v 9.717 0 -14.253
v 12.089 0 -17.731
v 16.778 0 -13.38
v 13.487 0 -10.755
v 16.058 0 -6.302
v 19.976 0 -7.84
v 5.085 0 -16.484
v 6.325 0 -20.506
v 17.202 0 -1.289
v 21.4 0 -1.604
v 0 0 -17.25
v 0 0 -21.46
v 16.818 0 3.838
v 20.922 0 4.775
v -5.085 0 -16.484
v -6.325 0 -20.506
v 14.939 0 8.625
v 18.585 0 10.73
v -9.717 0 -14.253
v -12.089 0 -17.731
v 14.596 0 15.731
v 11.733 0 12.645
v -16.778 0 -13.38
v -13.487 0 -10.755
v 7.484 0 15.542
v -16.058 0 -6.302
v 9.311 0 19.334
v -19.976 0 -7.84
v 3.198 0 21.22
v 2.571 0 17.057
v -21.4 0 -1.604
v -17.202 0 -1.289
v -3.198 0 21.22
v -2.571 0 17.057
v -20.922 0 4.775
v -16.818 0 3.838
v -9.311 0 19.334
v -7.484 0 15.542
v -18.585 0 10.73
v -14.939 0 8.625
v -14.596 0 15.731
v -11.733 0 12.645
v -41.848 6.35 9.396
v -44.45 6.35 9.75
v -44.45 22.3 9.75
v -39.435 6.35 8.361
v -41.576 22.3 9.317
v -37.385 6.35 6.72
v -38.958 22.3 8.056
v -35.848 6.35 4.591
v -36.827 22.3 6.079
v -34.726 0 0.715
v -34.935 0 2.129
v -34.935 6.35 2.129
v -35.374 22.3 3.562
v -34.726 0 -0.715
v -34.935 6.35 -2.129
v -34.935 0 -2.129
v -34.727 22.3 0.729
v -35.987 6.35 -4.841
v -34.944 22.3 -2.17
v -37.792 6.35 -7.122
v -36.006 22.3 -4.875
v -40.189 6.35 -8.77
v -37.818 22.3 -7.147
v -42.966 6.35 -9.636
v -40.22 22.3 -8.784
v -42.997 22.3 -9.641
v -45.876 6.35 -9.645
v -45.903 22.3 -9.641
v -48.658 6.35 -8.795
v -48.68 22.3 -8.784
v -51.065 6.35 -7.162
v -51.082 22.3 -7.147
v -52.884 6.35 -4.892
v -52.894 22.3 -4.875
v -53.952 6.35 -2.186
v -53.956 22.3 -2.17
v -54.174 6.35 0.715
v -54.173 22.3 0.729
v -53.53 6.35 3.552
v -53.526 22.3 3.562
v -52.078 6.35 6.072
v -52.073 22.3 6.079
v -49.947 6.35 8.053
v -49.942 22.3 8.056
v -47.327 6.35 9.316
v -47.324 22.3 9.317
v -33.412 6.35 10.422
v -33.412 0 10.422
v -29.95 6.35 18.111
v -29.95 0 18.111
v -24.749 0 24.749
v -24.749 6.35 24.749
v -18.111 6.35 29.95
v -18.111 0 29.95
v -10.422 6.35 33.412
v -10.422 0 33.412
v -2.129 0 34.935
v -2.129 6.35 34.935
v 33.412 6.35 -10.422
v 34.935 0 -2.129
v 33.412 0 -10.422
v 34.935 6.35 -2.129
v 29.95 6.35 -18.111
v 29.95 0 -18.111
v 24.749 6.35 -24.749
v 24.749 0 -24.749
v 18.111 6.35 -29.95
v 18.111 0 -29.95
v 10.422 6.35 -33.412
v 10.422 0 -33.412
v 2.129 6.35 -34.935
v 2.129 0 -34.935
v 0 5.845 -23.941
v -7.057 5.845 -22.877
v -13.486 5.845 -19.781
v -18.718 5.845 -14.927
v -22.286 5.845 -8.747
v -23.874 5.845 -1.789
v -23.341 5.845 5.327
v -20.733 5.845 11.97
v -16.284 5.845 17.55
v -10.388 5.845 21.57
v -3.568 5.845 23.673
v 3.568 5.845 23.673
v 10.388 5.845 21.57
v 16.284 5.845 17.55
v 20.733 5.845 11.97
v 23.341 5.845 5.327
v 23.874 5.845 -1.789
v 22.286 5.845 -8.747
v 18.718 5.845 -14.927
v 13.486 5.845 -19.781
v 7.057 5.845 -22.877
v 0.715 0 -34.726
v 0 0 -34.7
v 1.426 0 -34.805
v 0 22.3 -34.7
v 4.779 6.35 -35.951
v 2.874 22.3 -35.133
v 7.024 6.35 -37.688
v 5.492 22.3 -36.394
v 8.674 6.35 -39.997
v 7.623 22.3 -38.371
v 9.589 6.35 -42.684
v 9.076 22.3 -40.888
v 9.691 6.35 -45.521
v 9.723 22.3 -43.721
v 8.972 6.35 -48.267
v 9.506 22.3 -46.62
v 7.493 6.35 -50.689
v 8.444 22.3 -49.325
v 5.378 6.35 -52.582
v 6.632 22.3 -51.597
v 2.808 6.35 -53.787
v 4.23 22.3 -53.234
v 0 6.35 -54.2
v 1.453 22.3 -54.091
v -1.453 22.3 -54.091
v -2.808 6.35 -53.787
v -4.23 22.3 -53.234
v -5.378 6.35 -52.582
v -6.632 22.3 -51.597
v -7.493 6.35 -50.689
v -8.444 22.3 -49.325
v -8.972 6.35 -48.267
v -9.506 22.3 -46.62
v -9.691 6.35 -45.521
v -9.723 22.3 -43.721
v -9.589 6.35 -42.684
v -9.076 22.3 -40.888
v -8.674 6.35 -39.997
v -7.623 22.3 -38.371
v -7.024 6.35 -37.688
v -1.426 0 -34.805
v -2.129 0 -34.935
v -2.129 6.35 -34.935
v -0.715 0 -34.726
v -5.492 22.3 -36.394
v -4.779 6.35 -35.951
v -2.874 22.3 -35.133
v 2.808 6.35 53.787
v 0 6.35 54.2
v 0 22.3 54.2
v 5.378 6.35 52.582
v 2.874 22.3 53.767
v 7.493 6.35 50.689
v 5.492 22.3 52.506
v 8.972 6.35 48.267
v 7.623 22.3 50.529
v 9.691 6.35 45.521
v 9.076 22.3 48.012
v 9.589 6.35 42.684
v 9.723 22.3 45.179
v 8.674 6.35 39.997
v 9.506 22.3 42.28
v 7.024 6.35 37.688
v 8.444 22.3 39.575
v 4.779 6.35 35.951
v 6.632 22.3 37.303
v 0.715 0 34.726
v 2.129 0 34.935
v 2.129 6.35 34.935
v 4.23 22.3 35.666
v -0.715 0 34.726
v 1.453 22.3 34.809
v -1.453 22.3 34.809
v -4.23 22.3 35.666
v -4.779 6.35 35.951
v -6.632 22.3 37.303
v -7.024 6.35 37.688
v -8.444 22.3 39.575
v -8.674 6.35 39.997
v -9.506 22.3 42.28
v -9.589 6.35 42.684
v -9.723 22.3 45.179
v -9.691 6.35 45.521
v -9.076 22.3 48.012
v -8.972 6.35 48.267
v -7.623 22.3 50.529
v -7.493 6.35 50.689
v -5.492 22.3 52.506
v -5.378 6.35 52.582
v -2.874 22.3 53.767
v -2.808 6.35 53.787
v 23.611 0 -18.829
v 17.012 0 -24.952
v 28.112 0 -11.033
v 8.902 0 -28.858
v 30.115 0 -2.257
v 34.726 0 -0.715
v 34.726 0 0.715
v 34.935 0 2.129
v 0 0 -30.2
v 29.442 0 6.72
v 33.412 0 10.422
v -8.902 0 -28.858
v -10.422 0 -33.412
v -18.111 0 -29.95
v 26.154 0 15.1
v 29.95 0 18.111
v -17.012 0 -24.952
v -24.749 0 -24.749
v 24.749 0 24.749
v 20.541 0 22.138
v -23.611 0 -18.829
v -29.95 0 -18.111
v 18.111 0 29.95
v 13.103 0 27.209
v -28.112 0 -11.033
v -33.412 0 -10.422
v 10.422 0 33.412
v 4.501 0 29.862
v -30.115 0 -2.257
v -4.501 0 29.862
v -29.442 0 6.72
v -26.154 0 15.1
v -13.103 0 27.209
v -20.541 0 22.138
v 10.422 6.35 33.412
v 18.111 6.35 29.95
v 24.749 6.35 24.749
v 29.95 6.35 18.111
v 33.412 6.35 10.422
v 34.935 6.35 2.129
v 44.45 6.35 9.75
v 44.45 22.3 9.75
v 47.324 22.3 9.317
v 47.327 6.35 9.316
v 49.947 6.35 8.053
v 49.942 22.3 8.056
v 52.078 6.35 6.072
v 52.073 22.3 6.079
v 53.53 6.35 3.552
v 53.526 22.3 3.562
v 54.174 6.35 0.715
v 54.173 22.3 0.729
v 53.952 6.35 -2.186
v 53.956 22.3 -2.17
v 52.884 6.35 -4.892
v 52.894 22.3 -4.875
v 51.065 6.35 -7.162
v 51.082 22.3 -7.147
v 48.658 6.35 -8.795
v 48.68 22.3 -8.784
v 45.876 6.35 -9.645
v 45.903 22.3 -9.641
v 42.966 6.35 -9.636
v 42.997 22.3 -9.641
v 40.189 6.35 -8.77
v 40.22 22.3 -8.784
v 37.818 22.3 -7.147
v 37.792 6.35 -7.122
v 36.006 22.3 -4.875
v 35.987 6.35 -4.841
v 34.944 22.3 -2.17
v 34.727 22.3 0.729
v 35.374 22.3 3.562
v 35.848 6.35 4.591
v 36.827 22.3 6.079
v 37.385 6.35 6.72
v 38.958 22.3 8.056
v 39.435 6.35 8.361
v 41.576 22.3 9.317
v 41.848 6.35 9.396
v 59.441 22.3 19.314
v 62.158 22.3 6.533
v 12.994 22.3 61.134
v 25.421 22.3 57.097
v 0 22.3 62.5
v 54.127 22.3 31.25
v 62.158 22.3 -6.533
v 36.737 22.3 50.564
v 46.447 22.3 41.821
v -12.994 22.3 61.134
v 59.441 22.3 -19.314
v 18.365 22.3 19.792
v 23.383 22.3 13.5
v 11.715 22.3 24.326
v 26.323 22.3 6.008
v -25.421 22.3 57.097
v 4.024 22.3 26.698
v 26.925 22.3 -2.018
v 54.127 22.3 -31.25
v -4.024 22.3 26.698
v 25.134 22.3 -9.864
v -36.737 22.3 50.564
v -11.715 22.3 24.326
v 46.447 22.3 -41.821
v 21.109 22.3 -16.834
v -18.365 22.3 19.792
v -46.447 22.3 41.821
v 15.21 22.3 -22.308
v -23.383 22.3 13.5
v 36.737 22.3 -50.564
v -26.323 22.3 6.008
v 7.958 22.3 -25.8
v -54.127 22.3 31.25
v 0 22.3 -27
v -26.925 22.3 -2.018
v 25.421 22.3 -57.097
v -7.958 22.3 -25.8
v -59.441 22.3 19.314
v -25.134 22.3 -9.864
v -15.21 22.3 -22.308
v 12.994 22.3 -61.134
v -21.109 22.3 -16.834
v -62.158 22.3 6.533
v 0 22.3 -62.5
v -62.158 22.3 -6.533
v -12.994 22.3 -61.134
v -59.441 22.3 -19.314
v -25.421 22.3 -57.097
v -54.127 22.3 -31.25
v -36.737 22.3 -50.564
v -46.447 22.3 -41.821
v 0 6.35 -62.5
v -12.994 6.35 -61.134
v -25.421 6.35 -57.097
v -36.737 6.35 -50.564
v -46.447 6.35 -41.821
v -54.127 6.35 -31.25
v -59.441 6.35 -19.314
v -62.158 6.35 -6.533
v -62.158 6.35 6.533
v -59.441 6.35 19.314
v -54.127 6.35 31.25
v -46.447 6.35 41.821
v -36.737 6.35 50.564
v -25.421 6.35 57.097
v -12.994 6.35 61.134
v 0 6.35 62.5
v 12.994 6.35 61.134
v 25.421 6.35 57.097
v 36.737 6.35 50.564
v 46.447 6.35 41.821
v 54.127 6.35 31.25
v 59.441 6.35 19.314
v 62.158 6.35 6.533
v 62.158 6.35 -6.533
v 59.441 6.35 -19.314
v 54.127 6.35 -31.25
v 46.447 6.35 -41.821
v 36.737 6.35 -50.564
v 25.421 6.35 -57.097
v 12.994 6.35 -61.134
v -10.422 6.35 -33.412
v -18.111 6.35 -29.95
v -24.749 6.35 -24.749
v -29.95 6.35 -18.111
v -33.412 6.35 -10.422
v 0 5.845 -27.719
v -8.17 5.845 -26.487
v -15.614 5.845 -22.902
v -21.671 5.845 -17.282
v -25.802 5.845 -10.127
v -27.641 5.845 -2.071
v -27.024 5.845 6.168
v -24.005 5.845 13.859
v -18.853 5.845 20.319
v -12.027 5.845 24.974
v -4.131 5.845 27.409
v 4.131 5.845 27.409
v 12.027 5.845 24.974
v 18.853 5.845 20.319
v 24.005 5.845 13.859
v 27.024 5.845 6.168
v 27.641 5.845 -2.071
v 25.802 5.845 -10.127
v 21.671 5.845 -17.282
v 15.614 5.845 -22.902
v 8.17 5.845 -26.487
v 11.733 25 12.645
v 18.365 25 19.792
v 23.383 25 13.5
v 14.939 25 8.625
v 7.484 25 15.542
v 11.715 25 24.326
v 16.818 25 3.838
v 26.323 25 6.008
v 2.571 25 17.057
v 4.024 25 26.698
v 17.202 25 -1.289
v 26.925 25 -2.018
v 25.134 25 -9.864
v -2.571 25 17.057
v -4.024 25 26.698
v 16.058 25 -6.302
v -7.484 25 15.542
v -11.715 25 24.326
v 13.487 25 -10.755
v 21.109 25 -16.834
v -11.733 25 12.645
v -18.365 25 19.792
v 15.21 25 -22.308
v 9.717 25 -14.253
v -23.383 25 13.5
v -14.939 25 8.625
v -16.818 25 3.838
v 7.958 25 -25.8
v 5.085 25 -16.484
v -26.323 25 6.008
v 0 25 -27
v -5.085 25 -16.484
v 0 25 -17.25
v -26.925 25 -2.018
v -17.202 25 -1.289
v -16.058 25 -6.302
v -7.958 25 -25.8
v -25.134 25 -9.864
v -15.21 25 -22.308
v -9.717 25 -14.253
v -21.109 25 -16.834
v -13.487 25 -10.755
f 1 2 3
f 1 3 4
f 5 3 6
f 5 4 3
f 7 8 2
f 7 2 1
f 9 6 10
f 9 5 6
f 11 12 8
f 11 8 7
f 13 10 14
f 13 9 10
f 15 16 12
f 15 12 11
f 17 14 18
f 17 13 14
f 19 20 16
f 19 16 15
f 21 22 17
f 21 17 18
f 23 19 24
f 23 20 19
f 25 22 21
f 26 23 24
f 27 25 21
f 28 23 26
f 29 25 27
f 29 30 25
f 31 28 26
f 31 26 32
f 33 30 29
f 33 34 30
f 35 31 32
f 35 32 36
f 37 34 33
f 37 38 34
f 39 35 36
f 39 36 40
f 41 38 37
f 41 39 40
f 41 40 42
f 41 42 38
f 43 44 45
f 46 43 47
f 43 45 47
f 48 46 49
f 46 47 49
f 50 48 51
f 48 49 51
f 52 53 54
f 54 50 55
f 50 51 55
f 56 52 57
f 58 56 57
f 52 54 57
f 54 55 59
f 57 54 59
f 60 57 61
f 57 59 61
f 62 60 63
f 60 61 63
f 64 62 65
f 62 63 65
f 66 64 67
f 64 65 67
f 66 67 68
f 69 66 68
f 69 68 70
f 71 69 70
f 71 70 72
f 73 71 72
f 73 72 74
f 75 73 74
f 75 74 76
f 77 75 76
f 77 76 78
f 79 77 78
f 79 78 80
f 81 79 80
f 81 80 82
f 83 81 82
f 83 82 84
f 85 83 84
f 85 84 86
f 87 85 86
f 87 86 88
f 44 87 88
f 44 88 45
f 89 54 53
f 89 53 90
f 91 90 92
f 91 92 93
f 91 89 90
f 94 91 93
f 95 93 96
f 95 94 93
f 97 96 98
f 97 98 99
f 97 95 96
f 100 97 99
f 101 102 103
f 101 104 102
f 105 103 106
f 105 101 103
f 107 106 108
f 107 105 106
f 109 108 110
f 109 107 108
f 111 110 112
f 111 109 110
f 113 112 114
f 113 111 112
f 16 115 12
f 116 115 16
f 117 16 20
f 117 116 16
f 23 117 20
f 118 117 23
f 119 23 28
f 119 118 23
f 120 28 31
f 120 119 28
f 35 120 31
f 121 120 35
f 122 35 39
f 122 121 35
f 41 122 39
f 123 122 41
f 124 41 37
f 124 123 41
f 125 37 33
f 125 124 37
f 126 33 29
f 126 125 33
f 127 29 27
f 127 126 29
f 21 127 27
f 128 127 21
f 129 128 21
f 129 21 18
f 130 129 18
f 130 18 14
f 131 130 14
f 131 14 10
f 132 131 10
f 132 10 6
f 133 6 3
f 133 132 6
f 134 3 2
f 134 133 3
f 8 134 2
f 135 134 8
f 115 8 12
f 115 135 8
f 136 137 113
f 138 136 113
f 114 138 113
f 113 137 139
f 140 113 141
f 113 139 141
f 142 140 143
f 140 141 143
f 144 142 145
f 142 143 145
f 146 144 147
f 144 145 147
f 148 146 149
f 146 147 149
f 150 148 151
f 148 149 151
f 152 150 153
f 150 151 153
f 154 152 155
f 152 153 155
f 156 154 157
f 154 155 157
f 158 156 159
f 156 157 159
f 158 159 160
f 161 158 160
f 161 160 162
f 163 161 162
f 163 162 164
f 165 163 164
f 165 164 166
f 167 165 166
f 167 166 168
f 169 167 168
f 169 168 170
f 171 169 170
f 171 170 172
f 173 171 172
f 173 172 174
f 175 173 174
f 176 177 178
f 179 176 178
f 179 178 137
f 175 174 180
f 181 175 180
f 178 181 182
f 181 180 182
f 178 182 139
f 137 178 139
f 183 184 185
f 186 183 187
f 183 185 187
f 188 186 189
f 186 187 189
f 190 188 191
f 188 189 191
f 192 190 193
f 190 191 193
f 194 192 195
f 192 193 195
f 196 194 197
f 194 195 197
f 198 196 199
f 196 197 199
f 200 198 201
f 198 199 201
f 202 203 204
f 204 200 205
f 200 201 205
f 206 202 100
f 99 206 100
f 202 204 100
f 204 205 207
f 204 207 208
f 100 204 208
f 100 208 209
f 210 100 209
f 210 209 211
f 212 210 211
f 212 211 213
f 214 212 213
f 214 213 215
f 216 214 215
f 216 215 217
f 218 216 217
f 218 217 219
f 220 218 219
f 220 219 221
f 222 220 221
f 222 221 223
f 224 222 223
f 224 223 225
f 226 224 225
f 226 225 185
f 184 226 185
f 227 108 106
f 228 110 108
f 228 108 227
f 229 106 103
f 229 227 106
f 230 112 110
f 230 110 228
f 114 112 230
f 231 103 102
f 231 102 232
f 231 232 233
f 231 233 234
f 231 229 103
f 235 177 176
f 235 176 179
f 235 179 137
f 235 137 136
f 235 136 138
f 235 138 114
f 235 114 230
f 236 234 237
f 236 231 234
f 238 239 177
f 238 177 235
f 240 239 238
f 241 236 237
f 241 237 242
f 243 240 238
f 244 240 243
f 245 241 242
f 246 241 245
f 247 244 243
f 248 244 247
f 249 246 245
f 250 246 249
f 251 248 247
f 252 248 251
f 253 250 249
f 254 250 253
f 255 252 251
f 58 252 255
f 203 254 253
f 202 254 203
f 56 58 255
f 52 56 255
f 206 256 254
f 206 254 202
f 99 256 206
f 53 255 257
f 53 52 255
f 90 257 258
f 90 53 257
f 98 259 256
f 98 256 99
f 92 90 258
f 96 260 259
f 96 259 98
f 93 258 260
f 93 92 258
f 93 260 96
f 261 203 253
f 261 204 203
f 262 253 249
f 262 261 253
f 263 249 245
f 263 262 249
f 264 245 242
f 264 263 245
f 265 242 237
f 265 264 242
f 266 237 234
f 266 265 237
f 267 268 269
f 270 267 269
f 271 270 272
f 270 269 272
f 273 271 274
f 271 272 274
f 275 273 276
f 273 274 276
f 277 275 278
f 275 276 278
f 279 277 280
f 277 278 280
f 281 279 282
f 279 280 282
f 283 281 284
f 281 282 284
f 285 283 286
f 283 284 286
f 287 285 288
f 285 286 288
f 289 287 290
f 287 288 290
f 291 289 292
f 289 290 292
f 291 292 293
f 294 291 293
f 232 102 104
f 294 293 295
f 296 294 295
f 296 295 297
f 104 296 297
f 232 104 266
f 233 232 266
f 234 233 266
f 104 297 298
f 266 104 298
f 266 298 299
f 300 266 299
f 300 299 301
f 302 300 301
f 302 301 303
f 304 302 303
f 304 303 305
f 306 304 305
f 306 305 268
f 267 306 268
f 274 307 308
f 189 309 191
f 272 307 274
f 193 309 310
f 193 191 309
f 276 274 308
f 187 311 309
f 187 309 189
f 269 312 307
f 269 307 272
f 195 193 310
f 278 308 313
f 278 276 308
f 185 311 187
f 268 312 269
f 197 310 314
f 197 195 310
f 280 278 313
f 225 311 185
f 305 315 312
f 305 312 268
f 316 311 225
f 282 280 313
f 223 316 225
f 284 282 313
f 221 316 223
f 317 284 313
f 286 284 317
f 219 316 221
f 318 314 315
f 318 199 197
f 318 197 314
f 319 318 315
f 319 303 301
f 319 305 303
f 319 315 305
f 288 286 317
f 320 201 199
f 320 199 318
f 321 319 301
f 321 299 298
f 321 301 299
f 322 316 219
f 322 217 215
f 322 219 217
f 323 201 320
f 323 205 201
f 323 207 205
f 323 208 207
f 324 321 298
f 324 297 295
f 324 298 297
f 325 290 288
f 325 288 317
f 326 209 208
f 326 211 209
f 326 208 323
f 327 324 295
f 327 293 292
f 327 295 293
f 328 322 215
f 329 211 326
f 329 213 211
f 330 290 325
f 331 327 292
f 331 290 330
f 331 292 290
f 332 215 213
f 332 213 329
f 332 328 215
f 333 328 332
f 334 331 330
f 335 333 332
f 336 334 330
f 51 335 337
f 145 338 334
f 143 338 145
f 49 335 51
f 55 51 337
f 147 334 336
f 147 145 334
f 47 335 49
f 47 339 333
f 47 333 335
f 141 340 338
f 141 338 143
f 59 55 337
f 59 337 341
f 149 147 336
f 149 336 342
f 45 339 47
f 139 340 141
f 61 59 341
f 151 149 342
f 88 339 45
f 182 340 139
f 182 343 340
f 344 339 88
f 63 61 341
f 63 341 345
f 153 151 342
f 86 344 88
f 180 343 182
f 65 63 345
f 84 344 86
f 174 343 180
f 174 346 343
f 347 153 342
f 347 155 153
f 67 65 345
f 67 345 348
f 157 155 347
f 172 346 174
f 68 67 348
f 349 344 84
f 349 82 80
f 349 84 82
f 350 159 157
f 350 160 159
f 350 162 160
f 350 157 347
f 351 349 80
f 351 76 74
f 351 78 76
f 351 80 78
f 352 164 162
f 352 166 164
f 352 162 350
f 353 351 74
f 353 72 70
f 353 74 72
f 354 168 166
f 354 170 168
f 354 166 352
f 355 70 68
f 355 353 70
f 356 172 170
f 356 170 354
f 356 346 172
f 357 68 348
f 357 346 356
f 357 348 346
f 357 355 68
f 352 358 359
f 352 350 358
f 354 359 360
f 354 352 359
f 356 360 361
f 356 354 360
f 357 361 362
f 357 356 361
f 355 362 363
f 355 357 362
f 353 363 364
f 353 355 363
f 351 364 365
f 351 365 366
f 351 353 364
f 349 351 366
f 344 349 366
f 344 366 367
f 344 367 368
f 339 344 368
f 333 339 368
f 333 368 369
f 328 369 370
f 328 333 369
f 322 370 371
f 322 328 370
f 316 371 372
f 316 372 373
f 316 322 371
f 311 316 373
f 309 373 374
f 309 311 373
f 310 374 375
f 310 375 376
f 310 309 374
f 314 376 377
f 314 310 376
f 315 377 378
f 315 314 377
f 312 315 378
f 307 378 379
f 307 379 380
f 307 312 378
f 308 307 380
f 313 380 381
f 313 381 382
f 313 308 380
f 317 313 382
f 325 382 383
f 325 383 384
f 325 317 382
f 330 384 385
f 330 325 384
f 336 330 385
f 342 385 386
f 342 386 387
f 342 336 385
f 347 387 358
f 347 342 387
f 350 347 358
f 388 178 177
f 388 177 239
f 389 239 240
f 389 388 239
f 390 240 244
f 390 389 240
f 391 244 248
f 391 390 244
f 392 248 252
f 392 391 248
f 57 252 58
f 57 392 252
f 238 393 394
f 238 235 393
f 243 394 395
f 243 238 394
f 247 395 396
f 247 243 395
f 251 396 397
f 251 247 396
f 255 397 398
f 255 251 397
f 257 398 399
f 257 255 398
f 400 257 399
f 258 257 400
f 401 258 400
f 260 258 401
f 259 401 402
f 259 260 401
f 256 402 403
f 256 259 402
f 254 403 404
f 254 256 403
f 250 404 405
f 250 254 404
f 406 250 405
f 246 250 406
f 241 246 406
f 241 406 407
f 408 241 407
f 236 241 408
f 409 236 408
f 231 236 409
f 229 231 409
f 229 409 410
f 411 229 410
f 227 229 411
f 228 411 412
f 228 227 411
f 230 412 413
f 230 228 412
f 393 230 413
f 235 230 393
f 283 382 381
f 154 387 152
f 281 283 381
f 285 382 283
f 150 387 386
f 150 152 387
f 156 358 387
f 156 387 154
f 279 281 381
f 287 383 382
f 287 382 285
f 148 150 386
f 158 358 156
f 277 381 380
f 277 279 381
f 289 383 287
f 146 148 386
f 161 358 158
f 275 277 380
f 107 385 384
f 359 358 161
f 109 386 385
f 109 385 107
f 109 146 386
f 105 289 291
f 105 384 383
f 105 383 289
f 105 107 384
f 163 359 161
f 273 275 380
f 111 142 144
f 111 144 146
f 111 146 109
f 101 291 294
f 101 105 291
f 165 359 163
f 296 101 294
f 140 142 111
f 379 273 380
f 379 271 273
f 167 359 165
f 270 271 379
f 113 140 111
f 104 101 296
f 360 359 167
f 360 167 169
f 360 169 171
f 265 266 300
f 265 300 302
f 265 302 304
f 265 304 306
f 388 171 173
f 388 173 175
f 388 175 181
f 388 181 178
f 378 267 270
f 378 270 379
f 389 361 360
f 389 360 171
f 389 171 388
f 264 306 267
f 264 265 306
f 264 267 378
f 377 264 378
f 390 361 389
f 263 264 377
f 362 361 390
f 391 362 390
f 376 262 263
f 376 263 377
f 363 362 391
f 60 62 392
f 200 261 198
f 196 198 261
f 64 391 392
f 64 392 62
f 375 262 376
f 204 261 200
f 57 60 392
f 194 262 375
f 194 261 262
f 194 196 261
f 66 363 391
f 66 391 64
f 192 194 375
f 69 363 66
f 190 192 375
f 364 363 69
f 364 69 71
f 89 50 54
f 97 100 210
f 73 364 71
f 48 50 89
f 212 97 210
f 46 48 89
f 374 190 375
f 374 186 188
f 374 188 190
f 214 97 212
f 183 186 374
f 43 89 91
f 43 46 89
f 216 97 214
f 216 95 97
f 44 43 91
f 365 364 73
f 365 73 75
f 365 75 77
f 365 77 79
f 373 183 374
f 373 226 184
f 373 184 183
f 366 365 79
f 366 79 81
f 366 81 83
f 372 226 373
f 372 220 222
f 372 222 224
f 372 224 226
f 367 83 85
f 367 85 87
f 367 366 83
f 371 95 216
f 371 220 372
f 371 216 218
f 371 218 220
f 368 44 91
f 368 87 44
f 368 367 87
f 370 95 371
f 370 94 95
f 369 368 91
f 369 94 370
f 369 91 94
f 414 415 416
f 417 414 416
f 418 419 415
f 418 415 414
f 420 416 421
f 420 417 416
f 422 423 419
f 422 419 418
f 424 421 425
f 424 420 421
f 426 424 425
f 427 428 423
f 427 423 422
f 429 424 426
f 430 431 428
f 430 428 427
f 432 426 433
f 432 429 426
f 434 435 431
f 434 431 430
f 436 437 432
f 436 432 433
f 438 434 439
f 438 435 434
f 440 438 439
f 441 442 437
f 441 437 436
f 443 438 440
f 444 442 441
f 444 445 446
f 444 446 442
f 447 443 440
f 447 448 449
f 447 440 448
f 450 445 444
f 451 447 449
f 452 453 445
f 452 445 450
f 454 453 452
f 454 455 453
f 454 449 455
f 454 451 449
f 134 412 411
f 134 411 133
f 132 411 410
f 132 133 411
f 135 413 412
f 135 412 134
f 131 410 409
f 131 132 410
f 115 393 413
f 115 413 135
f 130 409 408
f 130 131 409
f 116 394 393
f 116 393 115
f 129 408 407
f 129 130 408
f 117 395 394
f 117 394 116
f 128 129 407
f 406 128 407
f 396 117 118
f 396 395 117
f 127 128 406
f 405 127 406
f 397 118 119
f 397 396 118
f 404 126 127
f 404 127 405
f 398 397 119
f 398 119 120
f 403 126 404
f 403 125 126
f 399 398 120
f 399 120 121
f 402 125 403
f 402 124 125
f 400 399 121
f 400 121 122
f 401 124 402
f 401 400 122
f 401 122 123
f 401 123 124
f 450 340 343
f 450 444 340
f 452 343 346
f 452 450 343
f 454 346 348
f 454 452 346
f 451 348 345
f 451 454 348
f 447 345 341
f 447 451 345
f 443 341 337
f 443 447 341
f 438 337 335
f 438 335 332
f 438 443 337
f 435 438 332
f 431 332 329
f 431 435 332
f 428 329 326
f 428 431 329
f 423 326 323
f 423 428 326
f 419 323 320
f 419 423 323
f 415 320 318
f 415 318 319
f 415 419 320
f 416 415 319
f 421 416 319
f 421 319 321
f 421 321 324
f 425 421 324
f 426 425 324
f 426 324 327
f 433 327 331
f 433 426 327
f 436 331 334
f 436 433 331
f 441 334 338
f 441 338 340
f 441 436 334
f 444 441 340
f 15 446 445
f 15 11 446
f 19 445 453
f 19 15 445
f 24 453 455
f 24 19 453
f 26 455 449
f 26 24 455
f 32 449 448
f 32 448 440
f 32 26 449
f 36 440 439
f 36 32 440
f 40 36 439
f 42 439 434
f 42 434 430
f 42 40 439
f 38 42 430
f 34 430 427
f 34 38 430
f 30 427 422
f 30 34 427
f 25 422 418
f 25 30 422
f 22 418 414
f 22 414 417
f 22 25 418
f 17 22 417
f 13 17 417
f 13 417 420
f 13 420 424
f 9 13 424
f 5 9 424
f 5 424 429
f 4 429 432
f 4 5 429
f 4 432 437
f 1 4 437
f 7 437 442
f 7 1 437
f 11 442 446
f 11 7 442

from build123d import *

# Parameters (mm, degrees)
SKETCH2_R          = 9.75
CUT_EXTRUDE1_DEPTH = 92.158049562


with BuildPart() as part:
    # Sketch1 → Revolve1 (revolve)
    with BuildSketch(Plane.XY, mode=Mode.PRIVATE) as revolve1_sk:
        Polygon((-17.25, 0), (-21.459646018, 0), (-23.940788684, 5.845205819), (-27.718503352, 5.845205819), (-30.199646018, 0), (-35, 0), (-35, 6.35), (-62.5, 6.35), (-62.5, 22.3), (-27, 22.3), (-27, 25), (-17.25, 25), align=None)
    revolve(revolve1_sk.sketch.rotate(Axis((0, 0, 0), (0, 1, 0)), 270), axis=Axis((0, 0, 0), (0, 1, 0)))

    # Sketch2 → Cut-Extrude1 (cut, through all)
    with BuildSketch(Plane(origin=(0, 22.3, 0), x_dir=(1, 0, 0), z_dir=(0, 1, 0))):
        with Locations(Location((-44.45, 0, 0), (0, 0, 270))):
            Circle(SKETCH2_R)
        with Locations(Location((0, 44.45, 0), (0, 0, 270))):
            Circle(SKETCH2_R)
        with Locations(Location((44.45, 0, 0), (0, 0, 270))):
            Circle(SKETCH2_R)
        with Locations(Location((0, -44.45, 0), (0, 0, 270))):
            Circle(SKETCH2_R)
    extrude(amount=-CUT_EXTRUDE1_DEPTH, mode=Mode.SUBTRACT)


solid = part.part
